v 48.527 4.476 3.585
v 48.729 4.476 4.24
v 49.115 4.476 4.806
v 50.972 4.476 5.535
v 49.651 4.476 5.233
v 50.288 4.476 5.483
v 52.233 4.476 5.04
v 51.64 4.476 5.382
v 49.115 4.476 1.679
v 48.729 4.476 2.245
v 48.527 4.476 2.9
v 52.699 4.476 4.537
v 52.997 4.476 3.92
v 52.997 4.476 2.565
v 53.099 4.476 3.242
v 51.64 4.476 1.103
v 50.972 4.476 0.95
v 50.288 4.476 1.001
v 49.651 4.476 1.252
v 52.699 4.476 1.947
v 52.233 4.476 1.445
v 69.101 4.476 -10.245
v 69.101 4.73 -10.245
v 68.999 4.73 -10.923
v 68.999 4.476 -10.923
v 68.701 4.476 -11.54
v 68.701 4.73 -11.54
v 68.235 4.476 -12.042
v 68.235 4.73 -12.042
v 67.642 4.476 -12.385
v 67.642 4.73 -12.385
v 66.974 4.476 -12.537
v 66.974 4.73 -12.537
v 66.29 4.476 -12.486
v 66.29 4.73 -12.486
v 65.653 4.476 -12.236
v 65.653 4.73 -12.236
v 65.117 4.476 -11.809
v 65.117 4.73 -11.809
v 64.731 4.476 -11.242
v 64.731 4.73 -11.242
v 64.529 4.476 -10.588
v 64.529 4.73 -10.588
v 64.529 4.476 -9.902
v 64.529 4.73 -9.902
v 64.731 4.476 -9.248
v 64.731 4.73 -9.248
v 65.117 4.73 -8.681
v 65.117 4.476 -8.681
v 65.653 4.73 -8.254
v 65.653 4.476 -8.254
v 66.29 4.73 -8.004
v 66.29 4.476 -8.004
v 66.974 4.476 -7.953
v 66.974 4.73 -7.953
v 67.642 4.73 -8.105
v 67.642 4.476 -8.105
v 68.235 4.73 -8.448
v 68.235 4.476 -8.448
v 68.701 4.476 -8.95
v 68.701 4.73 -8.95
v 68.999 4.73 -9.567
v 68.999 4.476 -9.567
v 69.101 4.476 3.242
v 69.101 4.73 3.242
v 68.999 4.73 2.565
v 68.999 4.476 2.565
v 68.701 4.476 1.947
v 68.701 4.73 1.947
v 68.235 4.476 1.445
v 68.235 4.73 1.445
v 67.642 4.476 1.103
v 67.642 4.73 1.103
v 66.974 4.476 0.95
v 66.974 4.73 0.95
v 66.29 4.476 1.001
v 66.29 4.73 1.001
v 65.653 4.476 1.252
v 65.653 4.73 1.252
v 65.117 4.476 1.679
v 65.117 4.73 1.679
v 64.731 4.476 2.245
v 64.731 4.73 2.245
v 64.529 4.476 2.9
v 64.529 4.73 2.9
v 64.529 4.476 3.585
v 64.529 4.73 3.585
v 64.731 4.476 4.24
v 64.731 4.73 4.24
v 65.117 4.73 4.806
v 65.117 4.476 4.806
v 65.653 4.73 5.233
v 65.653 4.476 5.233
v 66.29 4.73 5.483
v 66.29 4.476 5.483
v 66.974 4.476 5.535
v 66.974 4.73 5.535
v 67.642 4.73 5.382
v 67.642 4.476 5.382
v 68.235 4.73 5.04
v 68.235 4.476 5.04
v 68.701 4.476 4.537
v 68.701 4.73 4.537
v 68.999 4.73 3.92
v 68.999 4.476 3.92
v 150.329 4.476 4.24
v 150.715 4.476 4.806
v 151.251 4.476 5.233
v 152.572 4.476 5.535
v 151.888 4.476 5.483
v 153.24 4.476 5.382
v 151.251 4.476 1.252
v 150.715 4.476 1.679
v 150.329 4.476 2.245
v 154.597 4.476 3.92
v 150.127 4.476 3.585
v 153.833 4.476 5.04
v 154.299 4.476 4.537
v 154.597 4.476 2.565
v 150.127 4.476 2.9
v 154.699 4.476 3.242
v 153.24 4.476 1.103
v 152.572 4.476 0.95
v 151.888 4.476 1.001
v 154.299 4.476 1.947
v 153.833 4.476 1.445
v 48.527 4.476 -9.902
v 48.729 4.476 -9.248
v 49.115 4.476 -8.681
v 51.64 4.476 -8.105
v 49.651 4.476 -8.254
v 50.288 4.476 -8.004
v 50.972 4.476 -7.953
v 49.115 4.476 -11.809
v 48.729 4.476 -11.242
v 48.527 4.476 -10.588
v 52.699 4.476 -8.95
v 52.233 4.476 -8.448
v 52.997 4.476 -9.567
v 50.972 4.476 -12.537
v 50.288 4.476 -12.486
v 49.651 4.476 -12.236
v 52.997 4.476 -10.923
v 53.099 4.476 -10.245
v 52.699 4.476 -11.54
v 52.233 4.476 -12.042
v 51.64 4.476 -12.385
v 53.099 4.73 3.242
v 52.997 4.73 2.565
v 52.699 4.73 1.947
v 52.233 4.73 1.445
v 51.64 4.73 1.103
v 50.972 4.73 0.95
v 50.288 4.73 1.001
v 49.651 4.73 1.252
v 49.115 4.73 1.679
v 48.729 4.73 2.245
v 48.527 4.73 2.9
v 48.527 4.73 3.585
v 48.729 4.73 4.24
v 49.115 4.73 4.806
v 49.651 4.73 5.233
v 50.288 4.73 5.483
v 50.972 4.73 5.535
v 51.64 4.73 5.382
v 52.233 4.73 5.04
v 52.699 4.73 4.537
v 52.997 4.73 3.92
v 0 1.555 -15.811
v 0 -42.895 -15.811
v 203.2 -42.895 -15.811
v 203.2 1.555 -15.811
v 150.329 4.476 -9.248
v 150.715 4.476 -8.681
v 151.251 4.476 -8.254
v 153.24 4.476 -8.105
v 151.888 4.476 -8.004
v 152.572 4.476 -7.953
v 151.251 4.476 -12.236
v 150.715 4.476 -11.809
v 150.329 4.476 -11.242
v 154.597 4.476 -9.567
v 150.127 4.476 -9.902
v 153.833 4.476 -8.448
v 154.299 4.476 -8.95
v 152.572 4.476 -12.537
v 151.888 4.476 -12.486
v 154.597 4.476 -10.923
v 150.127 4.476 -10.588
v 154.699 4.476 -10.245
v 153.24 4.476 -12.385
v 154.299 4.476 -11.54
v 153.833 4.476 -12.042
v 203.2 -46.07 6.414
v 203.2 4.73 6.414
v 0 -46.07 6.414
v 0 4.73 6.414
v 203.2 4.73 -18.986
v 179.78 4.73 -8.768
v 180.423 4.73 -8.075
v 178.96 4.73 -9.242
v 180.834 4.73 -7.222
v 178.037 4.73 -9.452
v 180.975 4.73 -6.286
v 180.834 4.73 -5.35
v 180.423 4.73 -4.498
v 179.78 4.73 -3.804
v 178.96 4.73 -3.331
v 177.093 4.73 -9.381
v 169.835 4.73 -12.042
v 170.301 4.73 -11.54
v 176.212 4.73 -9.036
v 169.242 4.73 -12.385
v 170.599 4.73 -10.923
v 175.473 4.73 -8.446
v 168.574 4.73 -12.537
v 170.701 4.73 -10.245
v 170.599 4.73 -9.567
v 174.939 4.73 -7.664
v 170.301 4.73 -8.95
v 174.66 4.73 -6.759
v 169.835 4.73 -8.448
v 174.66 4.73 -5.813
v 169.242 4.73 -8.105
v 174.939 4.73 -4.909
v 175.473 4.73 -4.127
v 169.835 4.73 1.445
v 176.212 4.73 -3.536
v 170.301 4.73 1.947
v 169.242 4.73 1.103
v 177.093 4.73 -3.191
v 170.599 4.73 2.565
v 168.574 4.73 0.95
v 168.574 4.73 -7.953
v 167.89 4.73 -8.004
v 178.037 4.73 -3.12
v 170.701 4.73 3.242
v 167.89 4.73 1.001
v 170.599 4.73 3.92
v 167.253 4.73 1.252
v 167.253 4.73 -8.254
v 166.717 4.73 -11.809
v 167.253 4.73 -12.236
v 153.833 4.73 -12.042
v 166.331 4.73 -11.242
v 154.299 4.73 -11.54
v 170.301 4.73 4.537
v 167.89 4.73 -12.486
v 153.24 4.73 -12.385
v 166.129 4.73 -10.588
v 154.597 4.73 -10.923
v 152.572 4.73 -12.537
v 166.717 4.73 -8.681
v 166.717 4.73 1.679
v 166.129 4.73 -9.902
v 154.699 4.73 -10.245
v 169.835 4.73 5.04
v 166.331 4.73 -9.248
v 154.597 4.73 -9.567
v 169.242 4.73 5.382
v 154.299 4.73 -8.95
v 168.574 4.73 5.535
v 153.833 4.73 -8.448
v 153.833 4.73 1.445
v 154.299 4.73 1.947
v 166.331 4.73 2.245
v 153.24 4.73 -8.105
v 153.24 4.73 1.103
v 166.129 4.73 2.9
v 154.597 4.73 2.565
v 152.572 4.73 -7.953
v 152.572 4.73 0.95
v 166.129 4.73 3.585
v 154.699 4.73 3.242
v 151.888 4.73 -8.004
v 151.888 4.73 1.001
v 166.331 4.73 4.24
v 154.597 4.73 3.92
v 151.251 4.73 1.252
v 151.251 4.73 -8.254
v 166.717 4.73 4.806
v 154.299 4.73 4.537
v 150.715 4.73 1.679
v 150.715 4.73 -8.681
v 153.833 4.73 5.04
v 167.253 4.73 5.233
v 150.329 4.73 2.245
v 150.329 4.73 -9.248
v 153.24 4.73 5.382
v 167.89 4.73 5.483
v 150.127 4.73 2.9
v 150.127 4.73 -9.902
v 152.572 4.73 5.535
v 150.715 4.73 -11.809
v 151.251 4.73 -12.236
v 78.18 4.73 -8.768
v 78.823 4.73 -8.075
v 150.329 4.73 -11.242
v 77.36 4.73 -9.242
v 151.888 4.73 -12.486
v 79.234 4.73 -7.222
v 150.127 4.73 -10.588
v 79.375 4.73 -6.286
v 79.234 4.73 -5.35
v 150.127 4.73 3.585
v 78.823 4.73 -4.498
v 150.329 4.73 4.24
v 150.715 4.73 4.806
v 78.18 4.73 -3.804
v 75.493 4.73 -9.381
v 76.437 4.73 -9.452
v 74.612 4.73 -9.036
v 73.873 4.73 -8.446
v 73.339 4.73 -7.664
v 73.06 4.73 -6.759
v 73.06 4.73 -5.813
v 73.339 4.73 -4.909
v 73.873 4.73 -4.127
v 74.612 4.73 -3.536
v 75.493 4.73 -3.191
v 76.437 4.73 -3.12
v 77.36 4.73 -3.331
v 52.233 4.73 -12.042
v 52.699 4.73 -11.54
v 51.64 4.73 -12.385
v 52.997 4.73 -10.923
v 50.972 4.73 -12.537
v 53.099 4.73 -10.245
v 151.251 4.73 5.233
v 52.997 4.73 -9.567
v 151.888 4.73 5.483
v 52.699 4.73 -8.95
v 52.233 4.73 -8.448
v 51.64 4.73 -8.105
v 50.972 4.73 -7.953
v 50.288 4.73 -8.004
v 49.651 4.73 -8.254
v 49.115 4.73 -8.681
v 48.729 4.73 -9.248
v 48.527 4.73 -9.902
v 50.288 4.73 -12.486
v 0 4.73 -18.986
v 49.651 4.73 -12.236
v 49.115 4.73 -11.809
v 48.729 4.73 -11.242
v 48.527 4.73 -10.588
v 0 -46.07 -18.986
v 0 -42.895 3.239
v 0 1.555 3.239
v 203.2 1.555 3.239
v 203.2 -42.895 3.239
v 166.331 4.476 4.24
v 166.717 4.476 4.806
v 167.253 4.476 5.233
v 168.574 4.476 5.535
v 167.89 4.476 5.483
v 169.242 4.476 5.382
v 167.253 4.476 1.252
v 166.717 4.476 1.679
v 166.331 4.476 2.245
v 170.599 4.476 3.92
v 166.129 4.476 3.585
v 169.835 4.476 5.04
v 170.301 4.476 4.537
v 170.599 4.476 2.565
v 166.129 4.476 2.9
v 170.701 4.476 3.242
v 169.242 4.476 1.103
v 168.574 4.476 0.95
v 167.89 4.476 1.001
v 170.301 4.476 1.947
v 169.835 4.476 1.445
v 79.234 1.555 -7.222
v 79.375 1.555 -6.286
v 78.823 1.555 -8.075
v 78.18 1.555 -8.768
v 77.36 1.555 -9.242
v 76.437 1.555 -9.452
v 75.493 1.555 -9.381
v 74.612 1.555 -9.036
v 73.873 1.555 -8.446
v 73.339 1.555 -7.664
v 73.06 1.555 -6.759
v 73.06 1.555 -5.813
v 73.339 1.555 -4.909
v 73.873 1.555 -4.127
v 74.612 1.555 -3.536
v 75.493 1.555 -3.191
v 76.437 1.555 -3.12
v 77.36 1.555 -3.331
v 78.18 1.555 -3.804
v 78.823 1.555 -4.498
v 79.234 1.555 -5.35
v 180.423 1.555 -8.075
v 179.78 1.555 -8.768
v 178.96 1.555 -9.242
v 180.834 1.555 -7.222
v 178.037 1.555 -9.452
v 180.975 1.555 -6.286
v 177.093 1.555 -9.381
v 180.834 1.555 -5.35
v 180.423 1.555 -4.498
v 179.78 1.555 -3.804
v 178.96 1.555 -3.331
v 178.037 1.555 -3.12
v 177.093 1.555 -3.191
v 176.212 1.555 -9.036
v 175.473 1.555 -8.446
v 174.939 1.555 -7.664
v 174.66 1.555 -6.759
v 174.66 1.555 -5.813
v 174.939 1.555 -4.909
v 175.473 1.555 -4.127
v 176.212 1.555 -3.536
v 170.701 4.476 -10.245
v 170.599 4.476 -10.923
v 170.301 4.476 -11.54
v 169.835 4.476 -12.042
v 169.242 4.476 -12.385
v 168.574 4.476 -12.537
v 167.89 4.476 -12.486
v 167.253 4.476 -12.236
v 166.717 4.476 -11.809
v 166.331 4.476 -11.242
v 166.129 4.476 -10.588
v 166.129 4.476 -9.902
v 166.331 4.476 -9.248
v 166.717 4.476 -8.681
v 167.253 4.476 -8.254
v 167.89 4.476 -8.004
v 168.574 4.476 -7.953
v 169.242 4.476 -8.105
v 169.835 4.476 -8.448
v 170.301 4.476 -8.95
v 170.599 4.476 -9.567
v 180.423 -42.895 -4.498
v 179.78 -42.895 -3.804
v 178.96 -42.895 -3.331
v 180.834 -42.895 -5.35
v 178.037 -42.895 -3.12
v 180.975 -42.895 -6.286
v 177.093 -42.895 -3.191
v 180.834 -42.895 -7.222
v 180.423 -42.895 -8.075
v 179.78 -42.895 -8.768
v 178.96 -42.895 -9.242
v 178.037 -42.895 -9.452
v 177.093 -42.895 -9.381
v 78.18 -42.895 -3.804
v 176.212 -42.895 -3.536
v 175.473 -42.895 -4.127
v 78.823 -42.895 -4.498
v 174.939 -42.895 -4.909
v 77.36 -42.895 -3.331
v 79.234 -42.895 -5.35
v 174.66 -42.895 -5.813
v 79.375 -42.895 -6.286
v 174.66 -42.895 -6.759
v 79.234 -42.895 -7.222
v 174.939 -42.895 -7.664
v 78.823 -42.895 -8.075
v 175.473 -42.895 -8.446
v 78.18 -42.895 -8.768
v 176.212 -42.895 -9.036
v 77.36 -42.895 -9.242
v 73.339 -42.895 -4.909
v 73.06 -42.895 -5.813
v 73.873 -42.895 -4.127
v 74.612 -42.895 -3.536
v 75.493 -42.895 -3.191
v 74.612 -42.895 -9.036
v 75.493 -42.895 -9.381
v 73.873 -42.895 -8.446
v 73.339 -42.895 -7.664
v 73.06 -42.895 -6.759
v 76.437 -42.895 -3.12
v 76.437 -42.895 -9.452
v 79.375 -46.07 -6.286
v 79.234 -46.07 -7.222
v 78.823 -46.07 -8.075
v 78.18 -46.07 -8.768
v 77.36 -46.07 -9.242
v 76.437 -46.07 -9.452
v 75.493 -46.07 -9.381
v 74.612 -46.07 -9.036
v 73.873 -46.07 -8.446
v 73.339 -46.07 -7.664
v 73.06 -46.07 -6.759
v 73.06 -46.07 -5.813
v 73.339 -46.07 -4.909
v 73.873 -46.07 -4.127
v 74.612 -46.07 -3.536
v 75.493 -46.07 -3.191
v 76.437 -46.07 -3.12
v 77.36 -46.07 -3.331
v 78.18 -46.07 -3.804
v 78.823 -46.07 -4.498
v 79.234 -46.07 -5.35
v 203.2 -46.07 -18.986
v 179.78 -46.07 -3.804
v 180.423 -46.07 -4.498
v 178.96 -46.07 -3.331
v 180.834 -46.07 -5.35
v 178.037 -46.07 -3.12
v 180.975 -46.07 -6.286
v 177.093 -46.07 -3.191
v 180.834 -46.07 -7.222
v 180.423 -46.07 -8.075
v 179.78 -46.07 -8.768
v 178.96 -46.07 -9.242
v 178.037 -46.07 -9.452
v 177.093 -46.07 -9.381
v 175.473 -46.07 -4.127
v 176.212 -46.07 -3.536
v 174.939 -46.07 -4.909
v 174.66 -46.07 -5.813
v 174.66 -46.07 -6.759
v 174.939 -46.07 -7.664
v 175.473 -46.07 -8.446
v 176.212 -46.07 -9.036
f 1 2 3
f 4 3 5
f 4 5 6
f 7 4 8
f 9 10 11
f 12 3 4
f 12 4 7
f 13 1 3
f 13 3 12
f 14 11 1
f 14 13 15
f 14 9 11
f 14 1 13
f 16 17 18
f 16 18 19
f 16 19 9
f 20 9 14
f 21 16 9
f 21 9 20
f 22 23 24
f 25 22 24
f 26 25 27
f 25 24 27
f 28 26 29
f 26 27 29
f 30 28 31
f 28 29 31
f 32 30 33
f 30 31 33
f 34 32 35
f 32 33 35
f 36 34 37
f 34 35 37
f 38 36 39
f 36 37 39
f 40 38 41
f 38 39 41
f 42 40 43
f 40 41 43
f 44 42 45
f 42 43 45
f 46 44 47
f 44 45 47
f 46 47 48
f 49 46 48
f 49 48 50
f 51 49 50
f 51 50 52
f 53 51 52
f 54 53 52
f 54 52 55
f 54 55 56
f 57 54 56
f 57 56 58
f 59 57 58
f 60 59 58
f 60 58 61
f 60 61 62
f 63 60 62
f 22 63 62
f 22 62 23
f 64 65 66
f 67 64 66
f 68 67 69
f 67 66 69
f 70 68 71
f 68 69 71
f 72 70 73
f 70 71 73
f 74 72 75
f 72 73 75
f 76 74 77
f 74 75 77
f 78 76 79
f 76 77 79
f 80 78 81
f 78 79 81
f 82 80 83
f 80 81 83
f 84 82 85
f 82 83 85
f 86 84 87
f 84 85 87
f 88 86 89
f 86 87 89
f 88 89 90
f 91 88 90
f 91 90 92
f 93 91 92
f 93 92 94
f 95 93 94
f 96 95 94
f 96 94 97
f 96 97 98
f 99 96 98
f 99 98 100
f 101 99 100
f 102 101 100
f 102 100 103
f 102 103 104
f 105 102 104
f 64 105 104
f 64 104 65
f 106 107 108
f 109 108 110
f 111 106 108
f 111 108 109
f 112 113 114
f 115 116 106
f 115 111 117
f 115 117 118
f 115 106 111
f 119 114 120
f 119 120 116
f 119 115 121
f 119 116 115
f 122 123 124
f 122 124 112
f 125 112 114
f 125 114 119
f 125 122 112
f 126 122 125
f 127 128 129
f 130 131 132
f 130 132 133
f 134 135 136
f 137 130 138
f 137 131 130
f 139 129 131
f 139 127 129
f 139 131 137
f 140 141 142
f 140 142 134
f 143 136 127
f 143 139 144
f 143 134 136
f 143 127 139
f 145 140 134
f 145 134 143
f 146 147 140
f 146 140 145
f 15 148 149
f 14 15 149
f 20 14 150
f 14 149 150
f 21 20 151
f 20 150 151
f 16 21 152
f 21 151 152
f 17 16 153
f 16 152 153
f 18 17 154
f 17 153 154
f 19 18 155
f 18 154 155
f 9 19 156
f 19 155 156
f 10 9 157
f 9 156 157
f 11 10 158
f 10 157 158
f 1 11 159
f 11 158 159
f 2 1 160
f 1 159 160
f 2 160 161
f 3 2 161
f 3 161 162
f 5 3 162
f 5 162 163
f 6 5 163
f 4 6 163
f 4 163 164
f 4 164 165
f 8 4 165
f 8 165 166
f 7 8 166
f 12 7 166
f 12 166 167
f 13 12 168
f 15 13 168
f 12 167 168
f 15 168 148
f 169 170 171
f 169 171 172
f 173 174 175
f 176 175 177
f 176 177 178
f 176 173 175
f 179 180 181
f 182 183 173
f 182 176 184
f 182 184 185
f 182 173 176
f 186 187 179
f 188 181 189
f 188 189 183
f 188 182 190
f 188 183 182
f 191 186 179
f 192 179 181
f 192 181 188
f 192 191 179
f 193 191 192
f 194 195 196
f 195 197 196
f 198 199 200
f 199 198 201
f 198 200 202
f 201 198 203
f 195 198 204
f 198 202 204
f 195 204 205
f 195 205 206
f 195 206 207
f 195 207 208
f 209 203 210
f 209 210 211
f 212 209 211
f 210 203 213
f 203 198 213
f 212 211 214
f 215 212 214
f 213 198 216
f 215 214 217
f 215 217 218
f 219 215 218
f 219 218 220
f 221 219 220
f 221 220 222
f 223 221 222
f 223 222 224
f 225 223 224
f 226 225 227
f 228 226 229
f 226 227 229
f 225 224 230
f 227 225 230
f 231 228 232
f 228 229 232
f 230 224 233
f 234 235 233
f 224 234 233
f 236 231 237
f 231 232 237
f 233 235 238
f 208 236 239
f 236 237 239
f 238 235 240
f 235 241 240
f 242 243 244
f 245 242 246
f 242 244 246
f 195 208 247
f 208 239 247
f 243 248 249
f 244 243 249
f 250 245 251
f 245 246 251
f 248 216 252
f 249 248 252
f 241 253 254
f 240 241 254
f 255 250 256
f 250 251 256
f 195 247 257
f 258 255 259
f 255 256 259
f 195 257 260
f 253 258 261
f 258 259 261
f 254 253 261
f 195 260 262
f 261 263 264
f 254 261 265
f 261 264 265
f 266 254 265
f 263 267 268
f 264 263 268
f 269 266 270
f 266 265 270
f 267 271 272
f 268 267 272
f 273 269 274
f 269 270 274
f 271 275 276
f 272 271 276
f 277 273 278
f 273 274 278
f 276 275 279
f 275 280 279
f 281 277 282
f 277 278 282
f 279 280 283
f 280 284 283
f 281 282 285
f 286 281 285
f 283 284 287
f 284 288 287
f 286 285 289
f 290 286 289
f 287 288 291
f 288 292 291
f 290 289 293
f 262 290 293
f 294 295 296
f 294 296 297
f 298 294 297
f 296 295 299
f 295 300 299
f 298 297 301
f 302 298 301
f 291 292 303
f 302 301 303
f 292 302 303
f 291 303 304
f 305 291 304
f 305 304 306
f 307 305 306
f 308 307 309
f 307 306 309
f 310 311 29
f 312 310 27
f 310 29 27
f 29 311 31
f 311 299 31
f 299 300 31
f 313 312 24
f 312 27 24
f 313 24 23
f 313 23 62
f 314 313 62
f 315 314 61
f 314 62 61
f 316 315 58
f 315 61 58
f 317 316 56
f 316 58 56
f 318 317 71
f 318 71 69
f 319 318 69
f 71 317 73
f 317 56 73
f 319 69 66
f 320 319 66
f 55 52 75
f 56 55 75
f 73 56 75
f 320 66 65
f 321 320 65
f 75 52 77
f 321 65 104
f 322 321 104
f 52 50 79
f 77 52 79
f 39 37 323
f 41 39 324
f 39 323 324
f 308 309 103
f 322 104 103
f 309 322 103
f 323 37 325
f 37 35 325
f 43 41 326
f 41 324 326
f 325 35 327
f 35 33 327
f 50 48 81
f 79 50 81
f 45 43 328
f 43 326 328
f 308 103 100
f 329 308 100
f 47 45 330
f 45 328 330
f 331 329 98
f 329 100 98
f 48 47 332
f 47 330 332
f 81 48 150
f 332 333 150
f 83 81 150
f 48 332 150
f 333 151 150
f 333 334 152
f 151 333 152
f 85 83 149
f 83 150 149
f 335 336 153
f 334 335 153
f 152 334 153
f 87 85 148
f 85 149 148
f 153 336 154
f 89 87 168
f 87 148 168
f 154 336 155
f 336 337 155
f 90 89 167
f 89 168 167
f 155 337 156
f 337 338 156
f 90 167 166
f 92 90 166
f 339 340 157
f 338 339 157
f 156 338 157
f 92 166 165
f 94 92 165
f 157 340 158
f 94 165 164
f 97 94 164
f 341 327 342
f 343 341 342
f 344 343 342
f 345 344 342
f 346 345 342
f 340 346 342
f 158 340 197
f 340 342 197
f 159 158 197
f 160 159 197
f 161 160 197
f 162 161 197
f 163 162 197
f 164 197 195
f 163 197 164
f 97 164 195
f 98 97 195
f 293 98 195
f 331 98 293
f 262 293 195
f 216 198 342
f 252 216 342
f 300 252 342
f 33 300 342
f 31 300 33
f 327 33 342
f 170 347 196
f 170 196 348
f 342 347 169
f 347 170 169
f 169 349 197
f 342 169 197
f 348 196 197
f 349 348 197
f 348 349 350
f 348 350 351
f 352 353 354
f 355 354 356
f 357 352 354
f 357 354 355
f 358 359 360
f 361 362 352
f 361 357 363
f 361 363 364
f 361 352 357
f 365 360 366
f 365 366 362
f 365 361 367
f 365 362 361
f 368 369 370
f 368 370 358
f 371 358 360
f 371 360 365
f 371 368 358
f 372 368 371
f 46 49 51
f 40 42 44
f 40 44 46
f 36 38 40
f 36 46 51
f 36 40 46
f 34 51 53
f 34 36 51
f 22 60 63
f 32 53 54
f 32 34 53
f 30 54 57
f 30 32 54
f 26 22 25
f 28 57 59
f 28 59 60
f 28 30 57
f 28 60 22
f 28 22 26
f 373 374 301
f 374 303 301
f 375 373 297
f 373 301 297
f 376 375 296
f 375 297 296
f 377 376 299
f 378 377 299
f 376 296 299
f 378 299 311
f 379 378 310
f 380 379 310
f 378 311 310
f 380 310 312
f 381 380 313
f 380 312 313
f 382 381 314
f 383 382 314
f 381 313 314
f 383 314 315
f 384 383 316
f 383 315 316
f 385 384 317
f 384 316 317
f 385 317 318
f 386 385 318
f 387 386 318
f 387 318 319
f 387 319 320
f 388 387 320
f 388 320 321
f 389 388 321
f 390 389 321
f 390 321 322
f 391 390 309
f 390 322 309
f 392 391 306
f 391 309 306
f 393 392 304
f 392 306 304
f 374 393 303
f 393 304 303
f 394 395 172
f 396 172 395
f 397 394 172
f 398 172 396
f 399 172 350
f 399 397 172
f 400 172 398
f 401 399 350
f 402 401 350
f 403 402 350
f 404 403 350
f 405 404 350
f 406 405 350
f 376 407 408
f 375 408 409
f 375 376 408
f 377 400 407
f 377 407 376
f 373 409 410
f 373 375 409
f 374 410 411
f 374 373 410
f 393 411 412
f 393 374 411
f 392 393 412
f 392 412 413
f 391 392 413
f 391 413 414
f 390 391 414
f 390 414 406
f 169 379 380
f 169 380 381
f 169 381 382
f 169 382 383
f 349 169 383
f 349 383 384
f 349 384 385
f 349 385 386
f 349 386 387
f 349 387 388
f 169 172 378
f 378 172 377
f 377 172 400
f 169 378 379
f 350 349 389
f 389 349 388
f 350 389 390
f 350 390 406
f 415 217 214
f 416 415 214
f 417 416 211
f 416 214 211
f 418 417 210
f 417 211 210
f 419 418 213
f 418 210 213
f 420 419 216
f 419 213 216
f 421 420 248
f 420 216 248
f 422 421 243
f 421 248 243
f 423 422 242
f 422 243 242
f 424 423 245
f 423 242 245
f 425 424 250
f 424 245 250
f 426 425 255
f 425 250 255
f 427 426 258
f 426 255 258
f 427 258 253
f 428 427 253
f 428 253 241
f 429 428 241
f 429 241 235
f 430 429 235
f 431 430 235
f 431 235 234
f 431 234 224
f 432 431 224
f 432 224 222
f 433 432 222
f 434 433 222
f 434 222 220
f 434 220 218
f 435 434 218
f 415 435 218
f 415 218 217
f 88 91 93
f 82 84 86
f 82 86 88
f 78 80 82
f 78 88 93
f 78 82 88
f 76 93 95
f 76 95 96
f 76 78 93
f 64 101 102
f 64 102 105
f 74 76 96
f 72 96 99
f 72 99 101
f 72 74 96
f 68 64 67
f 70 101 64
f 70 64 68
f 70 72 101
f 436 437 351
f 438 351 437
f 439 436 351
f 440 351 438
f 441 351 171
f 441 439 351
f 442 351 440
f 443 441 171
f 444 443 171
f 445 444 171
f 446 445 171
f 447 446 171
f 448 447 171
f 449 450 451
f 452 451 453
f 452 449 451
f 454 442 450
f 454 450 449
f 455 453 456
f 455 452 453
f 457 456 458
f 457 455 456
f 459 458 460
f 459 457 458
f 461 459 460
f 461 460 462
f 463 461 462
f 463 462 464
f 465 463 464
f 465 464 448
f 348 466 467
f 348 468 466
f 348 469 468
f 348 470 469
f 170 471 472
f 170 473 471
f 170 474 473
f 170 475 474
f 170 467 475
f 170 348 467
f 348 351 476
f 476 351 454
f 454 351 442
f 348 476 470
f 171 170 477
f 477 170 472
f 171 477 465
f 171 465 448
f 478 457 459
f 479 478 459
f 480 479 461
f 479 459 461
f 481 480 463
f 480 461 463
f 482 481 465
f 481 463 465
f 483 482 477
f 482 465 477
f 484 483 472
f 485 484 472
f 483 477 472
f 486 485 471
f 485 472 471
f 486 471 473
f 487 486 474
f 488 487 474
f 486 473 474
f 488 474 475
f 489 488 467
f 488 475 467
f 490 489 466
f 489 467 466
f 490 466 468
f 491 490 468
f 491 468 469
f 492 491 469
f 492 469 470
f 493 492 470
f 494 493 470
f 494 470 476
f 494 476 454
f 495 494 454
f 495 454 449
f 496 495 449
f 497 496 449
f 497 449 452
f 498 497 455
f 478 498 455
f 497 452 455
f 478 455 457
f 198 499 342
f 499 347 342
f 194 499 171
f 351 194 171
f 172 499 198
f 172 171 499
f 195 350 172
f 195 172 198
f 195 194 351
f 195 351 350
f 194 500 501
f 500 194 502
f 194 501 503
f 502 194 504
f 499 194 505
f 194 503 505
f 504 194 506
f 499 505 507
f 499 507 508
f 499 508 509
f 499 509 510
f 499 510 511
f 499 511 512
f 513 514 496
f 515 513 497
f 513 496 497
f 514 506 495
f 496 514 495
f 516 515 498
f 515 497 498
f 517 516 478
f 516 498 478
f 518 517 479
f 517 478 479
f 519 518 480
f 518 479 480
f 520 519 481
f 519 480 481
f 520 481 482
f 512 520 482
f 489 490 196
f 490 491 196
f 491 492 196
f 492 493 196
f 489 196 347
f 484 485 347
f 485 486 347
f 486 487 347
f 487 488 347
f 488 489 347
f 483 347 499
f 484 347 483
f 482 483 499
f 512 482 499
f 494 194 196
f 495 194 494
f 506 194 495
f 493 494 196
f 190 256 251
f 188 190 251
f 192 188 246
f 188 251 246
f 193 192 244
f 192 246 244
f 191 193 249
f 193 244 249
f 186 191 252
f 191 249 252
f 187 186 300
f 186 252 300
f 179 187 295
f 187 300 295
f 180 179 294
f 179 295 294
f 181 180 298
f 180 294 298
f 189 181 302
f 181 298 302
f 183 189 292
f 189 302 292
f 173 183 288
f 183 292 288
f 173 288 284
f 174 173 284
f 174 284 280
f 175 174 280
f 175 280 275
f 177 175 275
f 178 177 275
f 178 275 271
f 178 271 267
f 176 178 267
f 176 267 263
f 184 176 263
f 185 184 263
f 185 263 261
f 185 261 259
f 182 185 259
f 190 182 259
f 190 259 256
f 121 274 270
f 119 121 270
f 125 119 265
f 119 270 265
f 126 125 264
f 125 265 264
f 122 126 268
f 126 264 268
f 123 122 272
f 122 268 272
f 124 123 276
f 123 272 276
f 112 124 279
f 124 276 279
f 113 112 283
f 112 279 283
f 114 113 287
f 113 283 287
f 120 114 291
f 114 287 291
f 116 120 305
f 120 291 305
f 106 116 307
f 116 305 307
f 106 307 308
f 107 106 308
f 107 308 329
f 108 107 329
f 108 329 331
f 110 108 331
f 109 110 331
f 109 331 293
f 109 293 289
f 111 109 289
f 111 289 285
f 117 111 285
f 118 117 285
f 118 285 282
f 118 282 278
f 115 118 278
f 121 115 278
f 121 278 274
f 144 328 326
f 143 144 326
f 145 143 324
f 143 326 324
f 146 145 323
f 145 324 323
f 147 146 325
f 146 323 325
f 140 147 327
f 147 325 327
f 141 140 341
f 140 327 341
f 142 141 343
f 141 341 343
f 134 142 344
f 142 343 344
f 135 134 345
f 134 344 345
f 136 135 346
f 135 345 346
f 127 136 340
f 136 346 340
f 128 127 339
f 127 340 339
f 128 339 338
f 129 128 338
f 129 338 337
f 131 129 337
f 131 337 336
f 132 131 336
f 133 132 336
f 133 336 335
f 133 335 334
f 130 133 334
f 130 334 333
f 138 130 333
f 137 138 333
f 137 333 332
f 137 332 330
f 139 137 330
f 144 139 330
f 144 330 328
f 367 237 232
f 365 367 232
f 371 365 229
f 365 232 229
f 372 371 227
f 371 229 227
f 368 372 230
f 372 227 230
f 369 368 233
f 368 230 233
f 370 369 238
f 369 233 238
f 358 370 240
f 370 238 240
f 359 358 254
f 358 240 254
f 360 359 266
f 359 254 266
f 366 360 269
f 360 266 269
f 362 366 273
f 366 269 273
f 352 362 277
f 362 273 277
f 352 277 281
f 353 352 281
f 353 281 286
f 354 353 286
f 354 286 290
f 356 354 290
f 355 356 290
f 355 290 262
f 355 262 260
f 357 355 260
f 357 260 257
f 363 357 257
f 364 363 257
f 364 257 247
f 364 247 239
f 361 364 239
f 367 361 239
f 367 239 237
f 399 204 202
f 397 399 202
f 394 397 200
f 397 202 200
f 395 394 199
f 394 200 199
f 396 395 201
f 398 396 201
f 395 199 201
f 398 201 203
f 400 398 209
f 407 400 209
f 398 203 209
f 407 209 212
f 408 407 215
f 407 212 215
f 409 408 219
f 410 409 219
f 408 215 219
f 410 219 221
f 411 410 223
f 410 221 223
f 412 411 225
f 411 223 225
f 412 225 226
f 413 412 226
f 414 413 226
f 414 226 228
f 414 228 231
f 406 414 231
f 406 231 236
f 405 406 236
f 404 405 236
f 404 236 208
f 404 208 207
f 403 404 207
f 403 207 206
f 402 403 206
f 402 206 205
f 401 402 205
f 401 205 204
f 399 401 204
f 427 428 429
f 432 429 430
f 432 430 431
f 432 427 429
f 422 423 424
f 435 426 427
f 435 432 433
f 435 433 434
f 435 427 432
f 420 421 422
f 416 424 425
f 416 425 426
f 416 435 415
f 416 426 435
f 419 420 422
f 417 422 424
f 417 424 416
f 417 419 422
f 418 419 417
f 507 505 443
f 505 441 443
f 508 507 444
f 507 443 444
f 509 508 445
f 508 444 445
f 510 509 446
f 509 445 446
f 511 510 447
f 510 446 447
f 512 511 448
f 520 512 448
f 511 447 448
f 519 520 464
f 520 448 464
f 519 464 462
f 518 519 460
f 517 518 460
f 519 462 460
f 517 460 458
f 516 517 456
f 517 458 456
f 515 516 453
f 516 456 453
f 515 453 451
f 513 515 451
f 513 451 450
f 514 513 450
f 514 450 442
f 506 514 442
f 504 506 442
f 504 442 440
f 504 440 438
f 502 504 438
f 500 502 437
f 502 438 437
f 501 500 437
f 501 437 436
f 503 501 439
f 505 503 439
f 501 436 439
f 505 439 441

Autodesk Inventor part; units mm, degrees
ref_plane "YZ Plane" through (0, 0, 0) normal (1, 0, 0) x (0, 1, 0)
ref_plane "XZ Plane" through (0, 0, 0) normal (0, 1, 0) x (-1, 0, 0)
ref_plane "XY Plane" through (0, 0, 0) normal (0, 0, 1) x (1, 0, 0)
sketch "Sketch1" plane through (0, 0, 0) normal (1, 0, 0) x (0, 1, 0)
  line L0 (4.7302, 6.4139) -> (-46.0698, 6.4139)
  line L1 (-46.0698, 6.4139) -> (-46.0698, -18.9861)
  line L2 (-46.0698, -18.9861) -> (4.7302, -18.9861)
  line L3 (4.7302, -18.9861) -> (4.7302, 6.4139)
  line L4 (1.5552, 3.2389) -> (-42.8948, 3.2389)
  line L5 (-42.8948, 3.2389) -> (-42.8948, -15.8111)
  line L6 (-42.8948, -15.8111) -> (1.5552, -15.8111)
  line L7 (1.5552, -15.8111) -> (1.5552, 3.2389)
  point P0 (0, 0)
  dimension "d0" = 50.8
  dimension "d1" = 25.4
  dimension "d2" = 3.175
extrude "Extrusion1" add sketch "Sketch1" along normal blind 203.2
sketch "Sketch2" plane through (0, 4.7302, 6.4139) normal (0, 1, 0) x (1, 0, 0)
  line L0 (0, 3.175) -> (0, 22.225) projected
  line L1 (0, 12.7) -> (127, 12.7) construction
  line L2 (127, 12.7) -> (177.8, 12.7) construction
  circle A0 centre (177.8, 12.7) radius 3.175
  line L3 (25.4, 12.7) -> (76.2, 12.7) construction
  circle A1 centre (76.2, 12.7) radius 3.175
  point P0 (0, 6.4139)
  dimension "d30" = 50.8
  dimension "d31" = 6.35
  dimension "d32" = 50.8
  dimension "d33" = 6.35
extrude "Extrusion2" cut sketch "Sketch2" against normal blind 203.2
sketch "Sketch3" plane through (0, 4.7302, 6.4139) normal (0, 1, 0) x (1, 0, 0)
  line L0 (0, 25.4) -> (203.2, 25.4) projected
  line L1 (0, 22.225) -> (0, 3.175) projected
  circle A0 centre (66.802, 16.6589) radius 2.2987
  circle A1 centre (66.802, 3.1715) radius 2.2987
  circle A2 centre (50.8, 3.1715) radius 2.2987
  circle A3 centre (152.4, 16.6589) radius 2.2987
  circle A4 centre (152.4, 3.1715) radius 2.2987
  circle A5 centre (168.402, 3.1715) radius 2.2987
  circle A6 centre (168.402, 16.6589) radius 2.2987
  circle A7 centre (50.8, 16.6589) radius 2.2987
  point P0 (0, 6.4139)
extrude "Extrusion3" cut sketch "Sketch3" against normal blind 0.254
properties part number "Clamp Mount Aligner v2"
